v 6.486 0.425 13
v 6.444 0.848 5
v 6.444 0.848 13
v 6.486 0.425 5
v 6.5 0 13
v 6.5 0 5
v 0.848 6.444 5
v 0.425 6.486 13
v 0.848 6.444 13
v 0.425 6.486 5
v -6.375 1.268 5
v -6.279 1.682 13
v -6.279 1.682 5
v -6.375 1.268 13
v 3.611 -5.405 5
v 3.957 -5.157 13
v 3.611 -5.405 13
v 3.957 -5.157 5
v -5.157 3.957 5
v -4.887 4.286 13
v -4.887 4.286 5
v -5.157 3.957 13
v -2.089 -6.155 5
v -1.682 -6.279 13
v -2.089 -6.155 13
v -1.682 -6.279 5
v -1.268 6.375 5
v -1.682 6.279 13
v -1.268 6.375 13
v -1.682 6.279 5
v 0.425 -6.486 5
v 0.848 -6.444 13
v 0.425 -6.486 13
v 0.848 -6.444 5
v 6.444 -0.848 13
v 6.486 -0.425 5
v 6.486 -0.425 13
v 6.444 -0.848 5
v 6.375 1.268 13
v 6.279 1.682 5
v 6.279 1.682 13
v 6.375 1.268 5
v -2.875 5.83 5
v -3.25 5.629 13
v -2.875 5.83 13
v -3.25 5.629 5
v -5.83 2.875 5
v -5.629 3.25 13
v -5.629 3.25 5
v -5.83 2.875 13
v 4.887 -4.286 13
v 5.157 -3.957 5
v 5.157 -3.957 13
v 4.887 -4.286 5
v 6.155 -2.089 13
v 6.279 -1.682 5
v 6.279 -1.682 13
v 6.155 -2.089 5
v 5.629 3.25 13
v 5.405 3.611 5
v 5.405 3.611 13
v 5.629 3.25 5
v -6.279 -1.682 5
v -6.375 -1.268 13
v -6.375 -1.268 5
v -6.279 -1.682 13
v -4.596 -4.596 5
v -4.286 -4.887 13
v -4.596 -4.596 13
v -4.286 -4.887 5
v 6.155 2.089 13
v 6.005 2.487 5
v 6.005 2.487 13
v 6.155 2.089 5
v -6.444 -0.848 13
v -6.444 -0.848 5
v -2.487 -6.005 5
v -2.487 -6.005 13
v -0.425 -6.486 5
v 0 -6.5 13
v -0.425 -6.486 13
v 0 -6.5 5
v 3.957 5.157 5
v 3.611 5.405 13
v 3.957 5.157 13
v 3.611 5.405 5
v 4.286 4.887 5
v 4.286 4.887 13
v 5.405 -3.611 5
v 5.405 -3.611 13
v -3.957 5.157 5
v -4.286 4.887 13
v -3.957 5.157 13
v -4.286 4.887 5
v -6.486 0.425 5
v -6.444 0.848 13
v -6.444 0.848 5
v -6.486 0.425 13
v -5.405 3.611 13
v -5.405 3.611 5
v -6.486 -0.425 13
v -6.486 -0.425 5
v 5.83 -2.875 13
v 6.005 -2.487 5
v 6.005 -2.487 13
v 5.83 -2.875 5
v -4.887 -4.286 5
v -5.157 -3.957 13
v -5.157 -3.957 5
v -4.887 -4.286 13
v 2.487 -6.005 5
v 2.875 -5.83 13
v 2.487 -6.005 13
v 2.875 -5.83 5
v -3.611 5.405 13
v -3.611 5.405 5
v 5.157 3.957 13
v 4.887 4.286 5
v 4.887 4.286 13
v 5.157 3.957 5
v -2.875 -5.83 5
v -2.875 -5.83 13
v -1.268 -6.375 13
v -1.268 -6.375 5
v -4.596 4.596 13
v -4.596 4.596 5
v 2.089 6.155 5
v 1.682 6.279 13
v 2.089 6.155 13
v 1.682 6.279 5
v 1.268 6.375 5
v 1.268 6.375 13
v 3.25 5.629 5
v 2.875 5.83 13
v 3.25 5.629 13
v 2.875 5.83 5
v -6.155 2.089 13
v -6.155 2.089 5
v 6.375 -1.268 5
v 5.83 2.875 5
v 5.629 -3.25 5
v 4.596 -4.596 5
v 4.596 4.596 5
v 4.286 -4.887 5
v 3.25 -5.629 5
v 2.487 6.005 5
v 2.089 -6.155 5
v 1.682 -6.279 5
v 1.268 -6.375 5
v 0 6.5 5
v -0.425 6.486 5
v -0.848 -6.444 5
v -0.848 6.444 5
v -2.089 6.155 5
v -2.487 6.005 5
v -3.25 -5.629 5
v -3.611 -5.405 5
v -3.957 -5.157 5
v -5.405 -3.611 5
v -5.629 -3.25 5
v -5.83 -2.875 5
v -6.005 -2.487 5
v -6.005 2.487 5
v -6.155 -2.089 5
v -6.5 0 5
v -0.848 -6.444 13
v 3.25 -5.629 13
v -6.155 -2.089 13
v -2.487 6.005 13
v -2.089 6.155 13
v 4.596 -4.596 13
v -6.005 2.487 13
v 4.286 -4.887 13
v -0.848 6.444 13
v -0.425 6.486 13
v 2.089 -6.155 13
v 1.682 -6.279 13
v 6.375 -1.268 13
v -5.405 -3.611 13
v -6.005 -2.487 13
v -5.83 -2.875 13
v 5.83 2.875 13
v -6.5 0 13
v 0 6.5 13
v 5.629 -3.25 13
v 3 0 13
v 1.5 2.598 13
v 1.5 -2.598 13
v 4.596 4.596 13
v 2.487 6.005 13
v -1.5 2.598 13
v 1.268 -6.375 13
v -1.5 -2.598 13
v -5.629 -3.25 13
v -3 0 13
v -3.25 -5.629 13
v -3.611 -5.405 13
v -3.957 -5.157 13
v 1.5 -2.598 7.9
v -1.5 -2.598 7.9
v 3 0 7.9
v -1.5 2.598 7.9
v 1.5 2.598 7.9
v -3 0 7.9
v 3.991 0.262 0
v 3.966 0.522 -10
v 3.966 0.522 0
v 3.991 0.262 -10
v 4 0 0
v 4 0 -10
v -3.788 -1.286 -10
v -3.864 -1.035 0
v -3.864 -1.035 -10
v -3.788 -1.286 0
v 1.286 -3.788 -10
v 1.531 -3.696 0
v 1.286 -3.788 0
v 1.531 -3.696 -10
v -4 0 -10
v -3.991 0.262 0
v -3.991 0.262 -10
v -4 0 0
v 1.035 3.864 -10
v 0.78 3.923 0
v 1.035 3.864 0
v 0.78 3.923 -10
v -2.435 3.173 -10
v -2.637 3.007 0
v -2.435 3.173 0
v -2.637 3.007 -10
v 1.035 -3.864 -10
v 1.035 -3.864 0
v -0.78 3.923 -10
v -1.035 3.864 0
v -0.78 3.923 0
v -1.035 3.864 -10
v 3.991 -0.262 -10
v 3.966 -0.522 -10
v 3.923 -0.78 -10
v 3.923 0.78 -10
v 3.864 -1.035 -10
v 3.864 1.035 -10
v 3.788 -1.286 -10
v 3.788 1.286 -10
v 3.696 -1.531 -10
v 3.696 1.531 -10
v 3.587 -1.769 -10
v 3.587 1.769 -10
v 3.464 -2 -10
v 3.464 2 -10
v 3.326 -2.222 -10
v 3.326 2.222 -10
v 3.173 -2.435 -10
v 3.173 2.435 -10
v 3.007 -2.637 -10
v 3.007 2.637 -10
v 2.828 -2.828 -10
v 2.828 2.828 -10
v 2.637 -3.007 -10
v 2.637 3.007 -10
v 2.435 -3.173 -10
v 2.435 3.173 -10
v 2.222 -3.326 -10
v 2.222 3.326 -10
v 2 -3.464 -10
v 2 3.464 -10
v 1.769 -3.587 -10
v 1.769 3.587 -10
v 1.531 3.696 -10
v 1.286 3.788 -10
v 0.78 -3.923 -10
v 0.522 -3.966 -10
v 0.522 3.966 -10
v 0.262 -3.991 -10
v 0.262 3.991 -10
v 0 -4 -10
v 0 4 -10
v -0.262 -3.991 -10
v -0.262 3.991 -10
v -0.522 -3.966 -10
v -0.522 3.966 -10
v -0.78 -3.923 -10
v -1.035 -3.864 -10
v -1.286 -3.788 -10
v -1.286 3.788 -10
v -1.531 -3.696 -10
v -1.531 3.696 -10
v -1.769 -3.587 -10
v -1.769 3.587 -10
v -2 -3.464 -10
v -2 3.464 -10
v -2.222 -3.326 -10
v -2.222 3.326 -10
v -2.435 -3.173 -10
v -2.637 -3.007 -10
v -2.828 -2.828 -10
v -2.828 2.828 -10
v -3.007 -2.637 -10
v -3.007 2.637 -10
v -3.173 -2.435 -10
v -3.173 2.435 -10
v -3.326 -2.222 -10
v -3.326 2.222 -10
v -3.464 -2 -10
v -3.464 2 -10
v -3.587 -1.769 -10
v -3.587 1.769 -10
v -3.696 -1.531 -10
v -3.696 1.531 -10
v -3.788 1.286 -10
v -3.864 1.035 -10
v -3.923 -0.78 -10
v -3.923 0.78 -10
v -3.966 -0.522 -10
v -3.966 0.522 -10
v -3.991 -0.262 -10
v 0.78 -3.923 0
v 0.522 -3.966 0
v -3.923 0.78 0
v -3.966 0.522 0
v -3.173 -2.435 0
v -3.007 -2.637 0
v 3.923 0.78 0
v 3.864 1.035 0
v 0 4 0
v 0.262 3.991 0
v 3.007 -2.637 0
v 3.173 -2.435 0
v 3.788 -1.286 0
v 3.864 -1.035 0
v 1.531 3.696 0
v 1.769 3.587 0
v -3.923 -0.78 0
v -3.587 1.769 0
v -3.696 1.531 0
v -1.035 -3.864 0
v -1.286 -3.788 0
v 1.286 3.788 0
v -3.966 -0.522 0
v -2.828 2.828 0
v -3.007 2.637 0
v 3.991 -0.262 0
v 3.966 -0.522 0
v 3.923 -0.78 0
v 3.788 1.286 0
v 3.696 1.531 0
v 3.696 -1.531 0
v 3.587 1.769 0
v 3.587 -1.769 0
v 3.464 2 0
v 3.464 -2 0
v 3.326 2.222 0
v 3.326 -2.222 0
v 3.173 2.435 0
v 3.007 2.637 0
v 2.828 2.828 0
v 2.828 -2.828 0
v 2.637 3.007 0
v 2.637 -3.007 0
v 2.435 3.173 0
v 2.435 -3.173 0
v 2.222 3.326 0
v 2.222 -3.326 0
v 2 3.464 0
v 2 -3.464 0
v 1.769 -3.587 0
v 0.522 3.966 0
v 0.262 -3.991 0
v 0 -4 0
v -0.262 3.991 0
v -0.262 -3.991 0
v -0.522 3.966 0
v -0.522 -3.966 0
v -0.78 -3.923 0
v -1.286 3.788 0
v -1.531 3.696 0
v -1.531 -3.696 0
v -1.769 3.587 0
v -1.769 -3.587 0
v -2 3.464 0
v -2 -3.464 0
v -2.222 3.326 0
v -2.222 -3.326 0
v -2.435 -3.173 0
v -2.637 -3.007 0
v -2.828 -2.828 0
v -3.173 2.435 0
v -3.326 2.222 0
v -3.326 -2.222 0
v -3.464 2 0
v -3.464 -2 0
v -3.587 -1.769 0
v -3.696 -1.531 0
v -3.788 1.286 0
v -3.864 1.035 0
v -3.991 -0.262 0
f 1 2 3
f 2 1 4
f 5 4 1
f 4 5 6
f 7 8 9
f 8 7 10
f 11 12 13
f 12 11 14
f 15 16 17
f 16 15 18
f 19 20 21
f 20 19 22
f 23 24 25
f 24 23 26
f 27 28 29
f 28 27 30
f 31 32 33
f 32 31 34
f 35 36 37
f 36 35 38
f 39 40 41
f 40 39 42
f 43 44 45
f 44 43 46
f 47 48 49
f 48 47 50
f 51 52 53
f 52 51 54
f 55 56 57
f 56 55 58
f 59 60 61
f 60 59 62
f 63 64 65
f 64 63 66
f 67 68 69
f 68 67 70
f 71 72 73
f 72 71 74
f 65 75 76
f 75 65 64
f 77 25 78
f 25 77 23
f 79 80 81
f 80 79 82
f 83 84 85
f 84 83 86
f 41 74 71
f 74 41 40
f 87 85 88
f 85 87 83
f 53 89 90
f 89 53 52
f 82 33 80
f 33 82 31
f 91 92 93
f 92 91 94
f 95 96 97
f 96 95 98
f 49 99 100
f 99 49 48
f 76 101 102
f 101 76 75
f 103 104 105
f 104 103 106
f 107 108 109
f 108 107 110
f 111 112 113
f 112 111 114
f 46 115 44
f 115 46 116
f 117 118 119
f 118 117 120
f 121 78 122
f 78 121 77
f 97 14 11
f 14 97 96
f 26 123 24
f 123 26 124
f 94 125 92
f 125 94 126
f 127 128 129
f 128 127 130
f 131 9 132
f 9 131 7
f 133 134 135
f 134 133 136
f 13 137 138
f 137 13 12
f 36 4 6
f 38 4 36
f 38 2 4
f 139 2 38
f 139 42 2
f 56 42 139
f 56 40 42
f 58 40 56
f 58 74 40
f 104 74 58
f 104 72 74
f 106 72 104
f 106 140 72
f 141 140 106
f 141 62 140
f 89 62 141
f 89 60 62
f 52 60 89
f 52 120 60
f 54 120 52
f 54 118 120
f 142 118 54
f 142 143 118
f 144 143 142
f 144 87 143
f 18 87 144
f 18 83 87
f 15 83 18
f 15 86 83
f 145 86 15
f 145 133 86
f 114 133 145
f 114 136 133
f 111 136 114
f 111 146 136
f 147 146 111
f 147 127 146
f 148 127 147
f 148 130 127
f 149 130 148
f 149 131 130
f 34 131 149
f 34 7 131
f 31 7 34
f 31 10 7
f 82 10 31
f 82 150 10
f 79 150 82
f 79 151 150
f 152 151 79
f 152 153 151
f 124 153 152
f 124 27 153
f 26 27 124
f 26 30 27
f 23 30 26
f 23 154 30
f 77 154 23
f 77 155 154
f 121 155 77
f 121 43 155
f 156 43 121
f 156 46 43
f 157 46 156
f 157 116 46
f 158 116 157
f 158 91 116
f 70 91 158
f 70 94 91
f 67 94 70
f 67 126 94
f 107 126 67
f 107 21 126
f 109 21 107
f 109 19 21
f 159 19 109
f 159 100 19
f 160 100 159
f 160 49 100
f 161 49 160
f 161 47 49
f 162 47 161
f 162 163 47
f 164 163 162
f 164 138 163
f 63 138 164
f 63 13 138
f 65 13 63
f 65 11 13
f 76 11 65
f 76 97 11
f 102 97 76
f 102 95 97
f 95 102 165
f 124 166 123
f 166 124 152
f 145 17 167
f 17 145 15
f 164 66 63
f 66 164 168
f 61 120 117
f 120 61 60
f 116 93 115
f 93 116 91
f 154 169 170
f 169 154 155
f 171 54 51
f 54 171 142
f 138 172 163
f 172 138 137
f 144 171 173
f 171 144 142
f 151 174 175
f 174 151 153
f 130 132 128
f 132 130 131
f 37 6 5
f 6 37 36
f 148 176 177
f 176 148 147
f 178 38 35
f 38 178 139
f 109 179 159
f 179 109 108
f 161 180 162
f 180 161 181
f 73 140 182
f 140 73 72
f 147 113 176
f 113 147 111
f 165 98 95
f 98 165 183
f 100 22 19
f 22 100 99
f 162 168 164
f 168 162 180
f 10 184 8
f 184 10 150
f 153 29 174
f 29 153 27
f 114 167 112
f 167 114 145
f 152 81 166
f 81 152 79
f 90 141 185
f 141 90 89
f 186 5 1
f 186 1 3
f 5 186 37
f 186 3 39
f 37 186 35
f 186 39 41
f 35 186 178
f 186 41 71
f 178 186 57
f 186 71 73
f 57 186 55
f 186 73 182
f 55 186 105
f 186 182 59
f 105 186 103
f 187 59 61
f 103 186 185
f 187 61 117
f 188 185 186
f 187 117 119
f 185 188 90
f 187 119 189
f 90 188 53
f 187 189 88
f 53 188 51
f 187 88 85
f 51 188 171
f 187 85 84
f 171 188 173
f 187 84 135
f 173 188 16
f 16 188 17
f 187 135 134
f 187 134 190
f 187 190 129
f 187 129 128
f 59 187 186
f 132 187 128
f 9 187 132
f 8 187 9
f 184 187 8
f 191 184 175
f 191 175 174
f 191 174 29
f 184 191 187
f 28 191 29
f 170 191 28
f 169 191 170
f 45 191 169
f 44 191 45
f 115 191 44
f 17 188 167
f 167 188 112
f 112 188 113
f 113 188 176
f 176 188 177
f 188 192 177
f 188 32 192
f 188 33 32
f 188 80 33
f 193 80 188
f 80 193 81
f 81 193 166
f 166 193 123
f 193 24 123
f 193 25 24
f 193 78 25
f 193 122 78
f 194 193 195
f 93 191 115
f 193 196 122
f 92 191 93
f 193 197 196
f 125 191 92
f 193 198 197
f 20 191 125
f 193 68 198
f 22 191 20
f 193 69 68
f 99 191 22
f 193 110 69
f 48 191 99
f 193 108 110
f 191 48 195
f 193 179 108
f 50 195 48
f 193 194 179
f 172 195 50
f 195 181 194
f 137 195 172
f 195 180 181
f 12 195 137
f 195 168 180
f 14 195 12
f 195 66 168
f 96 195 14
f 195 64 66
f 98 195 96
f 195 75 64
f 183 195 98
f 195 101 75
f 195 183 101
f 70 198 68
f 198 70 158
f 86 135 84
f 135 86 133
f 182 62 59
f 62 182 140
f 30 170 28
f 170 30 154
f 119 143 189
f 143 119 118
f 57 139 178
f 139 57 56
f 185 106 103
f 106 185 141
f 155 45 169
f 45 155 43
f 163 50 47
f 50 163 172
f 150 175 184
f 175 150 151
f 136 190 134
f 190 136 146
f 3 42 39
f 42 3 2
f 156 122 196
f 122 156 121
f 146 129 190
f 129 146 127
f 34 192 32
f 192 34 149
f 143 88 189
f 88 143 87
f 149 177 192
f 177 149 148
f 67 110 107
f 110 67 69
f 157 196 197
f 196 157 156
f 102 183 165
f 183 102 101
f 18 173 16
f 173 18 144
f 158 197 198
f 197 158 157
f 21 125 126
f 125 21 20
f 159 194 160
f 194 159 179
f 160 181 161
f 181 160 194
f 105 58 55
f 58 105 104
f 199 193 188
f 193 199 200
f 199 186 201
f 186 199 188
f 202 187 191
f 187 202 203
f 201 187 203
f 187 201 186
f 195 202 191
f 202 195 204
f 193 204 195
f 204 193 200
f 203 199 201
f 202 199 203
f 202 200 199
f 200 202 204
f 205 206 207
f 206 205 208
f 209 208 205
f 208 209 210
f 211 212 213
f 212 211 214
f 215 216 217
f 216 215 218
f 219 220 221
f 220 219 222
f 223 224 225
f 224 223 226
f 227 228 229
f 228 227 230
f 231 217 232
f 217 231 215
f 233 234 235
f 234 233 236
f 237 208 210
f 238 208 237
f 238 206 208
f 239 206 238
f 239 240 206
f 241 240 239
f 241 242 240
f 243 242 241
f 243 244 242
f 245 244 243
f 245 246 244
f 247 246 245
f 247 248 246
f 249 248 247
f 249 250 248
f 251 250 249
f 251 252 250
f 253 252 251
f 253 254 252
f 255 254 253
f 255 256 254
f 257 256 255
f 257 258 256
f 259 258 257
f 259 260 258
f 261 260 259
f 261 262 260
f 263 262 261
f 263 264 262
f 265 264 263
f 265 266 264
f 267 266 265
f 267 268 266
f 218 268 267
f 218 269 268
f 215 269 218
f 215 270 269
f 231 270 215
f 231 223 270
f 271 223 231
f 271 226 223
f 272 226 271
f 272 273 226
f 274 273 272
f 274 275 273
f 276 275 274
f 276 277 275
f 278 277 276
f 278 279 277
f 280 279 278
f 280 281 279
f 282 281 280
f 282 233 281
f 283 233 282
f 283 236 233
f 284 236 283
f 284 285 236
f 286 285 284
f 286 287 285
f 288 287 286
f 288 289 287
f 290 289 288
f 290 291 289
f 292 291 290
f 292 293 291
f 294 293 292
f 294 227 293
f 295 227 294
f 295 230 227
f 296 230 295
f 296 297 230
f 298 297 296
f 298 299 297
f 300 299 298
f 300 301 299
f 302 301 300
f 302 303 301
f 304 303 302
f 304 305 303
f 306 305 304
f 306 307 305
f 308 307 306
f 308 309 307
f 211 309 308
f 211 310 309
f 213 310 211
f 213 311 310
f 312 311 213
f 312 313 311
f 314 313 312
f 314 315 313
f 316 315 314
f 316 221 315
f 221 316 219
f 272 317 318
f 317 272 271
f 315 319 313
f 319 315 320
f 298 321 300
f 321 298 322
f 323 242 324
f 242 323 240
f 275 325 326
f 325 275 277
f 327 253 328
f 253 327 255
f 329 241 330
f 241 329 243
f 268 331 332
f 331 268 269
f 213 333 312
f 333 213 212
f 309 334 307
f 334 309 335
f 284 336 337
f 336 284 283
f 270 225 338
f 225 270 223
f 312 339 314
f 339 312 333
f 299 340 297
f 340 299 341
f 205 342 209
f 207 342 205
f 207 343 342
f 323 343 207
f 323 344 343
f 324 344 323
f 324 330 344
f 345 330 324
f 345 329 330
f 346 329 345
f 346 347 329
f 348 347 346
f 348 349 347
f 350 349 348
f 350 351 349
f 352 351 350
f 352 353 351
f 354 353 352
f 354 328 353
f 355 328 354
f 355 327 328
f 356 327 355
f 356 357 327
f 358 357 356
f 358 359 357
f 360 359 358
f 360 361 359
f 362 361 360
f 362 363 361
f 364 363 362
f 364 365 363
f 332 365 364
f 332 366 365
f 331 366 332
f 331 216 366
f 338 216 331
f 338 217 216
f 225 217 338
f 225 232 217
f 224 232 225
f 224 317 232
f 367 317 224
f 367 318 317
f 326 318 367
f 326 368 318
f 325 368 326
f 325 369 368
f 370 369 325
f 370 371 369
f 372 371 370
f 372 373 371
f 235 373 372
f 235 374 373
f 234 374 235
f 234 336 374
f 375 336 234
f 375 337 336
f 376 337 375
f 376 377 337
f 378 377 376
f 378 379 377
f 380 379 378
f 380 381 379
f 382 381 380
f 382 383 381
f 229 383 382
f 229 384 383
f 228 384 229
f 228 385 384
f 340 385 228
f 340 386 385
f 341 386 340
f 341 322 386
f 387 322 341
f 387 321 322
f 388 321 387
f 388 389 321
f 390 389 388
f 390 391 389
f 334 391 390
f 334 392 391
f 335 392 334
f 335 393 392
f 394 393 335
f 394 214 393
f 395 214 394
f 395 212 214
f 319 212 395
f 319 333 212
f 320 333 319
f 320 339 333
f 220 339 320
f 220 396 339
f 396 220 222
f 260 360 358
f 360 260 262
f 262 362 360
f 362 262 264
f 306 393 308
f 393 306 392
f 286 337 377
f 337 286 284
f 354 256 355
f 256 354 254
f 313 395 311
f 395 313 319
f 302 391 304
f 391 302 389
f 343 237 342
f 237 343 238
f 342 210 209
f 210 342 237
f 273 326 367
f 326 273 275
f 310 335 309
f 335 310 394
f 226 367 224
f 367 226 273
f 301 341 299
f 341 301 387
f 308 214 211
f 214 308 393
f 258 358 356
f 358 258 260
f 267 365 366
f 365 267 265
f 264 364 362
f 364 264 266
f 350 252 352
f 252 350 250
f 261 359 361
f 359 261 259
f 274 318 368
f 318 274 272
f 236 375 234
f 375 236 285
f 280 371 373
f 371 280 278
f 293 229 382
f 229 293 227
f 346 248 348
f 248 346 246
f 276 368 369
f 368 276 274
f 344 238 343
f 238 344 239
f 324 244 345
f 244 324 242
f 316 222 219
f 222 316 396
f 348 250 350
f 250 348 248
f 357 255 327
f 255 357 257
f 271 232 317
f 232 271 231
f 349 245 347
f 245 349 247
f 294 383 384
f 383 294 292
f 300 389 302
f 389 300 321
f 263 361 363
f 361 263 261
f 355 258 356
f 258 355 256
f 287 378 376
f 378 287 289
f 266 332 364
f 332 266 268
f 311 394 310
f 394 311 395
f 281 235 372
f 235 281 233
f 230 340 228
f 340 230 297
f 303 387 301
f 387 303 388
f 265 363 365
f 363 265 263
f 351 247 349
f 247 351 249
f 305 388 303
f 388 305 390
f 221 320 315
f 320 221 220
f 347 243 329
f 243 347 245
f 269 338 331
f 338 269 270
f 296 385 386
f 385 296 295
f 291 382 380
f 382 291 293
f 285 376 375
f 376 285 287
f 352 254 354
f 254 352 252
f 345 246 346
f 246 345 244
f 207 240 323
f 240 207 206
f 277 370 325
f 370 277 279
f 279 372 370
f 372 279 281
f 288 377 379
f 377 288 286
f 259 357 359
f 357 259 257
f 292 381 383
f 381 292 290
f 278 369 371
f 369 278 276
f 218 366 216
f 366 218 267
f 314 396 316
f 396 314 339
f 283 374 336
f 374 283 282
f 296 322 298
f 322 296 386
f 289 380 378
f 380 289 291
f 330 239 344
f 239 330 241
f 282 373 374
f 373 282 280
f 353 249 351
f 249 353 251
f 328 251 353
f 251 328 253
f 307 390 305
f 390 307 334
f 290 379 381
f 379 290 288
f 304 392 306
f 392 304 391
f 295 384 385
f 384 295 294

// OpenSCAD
$fn=96;

module socket_head_cap_screw(d=8.0, head_d=13.0, head_h=8.0, shank_l=10.0, socket_d=6.0, socket_depth=5.0){
    union(){
        translate([0,0,-shank_l/2])
            cylinder(d=d, h=shank_l, center=true);

        difference(){
            translate([0,0,shank_l/2 + head_h/2])
                cylinder(d=head_d, h=head_h, center=true);

            translate([0,0,shank_l/2 + head_h - socket_depth/2])
                cylinder(d=socket_d, h=socket_depth+0.2, center=true, $fn=6);
        }
    }
}

socket_head_cap_screw(d=8.0, head_d=13.0, head_h=8.0, shank_l=10.0, socket_d=6.0, socket_depth=5.0);
